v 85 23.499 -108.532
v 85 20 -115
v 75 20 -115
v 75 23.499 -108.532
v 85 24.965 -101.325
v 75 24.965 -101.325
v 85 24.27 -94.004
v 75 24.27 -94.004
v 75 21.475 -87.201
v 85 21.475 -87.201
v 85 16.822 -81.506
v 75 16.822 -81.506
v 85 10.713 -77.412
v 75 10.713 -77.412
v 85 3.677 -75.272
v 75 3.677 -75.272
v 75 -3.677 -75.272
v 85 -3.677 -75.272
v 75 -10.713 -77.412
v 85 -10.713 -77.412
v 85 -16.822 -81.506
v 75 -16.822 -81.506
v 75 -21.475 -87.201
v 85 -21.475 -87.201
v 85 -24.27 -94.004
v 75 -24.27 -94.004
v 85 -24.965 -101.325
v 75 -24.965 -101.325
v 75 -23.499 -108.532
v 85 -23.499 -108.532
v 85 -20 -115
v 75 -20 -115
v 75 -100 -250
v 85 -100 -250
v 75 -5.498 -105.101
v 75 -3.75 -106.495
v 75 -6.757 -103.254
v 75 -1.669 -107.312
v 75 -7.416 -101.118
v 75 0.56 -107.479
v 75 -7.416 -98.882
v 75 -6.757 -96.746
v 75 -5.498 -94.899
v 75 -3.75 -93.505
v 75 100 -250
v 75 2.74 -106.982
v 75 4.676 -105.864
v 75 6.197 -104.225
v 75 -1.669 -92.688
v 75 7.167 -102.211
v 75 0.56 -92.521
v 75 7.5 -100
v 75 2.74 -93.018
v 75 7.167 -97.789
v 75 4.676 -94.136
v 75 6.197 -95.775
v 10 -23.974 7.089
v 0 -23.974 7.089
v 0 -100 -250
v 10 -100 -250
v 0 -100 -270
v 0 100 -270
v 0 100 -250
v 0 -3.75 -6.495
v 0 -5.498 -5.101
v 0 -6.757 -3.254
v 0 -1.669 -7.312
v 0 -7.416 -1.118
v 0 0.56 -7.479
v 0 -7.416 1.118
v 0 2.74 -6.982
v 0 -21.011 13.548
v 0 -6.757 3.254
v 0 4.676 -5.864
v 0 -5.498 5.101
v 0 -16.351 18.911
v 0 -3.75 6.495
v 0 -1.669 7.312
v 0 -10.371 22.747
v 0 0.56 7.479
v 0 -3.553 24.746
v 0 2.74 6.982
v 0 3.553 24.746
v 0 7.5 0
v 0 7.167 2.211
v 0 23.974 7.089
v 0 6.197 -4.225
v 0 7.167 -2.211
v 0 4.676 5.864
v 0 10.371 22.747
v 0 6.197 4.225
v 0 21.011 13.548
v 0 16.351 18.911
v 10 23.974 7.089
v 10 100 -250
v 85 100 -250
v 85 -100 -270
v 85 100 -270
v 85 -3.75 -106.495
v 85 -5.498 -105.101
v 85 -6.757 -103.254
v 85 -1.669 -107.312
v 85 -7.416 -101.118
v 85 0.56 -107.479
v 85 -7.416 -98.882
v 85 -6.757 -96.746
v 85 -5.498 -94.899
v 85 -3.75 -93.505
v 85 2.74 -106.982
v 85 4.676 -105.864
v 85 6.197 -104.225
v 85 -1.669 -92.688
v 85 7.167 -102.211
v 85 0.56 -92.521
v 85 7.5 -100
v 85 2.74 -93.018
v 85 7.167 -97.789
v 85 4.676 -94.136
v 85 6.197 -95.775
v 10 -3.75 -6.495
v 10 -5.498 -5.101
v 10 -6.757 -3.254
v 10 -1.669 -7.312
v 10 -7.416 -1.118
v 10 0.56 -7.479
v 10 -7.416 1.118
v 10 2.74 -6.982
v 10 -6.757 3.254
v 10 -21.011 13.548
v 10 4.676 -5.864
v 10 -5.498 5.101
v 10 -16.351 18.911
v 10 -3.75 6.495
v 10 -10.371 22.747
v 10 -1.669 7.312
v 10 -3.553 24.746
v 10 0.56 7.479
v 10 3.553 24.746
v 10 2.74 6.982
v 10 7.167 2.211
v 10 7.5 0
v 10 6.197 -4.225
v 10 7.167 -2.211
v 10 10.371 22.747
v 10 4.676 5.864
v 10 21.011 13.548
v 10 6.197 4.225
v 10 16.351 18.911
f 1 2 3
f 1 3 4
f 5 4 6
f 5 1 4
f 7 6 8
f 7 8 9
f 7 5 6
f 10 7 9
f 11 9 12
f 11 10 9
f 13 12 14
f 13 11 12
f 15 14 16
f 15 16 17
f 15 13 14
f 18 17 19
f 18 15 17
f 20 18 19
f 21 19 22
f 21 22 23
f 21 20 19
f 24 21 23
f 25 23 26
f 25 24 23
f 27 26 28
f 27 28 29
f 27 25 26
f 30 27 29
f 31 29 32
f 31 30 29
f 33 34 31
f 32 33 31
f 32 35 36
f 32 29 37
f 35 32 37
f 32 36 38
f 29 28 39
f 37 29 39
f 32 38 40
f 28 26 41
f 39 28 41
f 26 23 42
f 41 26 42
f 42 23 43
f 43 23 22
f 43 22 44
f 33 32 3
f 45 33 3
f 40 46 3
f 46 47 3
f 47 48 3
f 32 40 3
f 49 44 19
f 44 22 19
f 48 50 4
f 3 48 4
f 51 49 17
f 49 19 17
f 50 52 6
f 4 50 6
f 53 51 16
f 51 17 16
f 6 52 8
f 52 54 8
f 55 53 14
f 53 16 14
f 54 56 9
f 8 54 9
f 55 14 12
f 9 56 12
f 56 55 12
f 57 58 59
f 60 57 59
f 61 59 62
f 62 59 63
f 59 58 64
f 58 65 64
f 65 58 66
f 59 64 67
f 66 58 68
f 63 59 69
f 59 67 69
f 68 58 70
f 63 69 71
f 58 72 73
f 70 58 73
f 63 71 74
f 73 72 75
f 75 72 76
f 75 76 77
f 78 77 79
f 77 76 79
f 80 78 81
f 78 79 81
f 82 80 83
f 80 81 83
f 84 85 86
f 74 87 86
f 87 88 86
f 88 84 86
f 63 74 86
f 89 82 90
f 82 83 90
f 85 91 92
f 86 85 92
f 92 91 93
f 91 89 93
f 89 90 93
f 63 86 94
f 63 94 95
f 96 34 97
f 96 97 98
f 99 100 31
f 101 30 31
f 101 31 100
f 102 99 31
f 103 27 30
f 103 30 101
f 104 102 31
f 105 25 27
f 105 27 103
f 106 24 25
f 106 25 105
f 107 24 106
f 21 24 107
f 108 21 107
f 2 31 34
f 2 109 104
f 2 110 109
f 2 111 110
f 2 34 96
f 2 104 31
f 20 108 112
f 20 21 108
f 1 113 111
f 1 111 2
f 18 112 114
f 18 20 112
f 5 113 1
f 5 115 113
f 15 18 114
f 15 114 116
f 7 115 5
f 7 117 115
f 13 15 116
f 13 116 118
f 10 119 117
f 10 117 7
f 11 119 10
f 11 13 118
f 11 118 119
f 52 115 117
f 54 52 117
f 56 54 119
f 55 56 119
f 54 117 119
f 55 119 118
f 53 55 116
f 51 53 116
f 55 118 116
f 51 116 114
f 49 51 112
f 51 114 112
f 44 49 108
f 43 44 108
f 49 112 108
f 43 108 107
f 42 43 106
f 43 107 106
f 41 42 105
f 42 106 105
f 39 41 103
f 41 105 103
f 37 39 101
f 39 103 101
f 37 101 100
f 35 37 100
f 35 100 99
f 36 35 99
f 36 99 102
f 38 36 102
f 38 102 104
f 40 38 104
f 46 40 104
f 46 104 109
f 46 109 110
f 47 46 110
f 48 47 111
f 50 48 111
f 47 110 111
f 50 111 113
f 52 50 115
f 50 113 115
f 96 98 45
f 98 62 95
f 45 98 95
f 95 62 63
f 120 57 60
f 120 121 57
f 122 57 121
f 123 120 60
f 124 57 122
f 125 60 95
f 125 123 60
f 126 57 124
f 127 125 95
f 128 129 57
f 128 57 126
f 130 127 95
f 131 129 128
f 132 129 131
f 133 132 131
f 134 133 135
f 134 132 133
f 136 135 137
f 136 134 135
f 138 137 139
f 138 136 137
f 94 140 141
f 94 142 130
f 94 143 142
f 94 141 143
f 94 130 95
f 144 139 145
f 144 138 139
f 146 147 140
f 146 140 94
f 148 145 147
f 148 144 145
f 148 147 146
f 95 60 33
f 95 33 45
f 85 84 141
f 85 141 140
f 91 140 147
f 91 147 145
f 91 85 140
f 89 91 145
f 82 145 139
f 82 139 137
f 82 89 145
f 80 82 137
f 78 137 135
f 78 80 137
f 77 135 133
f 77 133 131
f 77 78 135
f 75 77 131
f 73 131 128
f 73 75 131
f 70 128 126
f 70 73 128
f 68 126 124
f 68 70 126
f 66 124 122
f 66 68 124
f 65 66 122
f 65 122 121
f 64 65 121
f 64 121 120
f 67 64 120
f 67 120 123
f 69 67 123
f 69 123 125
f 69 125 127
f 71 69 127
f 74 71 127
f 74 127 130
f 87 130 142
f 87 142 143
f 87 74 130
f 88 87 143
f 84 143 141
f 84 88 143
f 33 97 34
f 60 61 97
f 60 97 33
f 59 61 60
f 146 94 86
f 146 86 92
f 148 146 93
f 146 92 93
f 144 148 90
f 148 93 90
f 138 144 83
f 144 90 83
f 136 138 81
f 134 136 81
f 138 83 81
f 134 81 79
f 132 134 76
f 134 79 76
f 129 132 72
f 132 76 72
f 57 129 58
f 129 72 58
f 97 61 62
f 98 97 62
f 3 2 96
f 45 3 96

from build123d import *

# Parameters (mm, degrees)
SKETCH_0_R   = 7.5
PAD_DEPTH    = 10
SKETCH_2_W   = 200
SKETCH_2_H   = 20
PAD001_DEPTH = 85
SKETCH_1_R   = 7.5
PAD002_DEPTH = 10


with BuildPart() as part:
    # Sketch_0 (on LCS_) → Pad (new body)
    with BuildSketch(Plane.YZ):
        with BuildLine():
            ThreePointArc((23.973718, 7.089487), (0, 25), (-23.973718, 7.089487))
            Line((-23.973718, 7.089487), (-100, -250))
            Line((-100, -250), (100, -250))
            Line((23.973718, 7.089487), (100, -250))
        make_face()
        Circle(SKETCH_0_R, mode=Mode.SUBTRACT)
    extrude(amount=PAD_DEPTH)

    # Sketch_2 (on LCS_) → Pad001 (join)
    with BuildSketch(Plane.YZ):
        with Locations((0, -260)):
            Rectangle(SKETCH_2_W, SKETCH_2_H)
    extrude(amount=PAD001_DEPTH)

    # Sketch_1 (on LCS_triangle) → Pad002 (join)
    with BuildSketch(Plane(origin=(85, 0, -100), x_dir=(0, 1, 0), z_dir=(1, 0, 0))):
        with BuildLine():
            ThreePointArc((20, -15), (0, 25), (-20, -15))
            Line((-100, -150), (-20, -15))
            Line((100, -150), (-100, -150))
            Line((20, -15), (100, -150))
        make_face()
        Circle(SKETCH_1_R, mode=Mode.SUBTRACT)
    extrude(amount=-PAD002_DEPTH)


solid = part.part
